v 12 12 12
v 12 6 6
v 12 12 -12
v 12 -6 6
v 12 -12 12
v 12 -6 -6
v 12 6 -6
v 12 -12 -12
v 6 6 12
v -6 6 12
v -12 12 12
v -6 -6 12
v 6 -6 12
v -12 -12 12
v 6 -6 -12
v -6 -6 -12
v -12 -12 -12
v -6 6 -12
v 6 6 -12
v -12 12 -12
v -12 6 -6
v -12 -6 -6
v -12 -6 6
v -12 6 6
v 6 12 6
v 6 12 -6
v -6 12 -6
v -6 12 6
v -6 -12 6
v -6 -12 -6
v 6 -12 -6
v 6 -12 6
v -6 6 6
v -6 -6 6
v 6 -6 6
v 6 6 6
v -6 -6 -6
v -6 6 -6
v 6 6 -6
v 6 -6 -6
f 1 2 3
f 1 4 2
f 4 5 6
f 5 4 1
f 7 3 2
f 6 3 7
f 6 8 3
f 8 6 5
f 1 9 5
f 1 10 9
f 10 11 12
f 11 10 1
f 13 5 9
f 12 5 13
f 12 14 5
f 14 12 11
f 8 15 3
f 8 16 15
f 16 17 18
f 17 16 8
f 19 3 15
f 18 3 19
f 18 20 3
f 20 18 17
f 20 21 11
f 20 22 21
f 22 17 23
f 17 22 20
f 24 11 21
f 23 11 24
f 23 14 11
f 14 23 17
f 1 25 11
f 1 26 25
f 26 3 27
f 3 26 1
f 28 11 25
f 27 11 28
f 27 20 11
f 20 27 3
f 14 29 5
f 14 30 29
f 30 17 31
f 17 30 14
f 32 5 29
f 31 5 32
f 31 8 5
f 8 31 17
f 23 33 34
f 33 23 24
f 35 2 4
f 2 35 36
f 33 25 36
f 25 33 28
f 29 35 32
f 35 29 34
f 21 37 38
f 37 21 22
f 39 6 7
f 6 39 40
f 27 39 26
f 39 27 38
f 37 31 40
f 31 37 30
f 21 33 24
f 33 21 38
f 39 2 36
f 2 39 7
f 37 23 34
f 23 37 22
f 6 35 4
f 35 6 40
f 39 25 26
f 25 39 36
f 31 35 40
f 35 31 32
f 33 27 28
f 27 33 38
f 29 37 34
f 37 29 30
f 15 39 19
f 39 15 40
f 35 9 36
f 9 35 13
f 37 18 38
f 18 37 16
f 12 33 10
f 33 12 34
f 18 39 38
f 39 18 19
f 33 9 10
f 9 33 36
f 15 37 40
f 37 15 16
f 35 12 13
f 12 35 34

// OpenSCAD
// Two perpendicular square tunnels at different heights, separated by a web.
side = 24;
opening = 8;
offset = 5;

color("#168fe5")
difference() {
    cube(side, center=true);
    cube([side*2, side/2, side/2], center=true);
    cube([side/2, side*2, side/2], center=true);
    %cube([side/2, side*1.75, side/2], center=true);
    cube([side/2, side/2, side*2], center=true);
}
